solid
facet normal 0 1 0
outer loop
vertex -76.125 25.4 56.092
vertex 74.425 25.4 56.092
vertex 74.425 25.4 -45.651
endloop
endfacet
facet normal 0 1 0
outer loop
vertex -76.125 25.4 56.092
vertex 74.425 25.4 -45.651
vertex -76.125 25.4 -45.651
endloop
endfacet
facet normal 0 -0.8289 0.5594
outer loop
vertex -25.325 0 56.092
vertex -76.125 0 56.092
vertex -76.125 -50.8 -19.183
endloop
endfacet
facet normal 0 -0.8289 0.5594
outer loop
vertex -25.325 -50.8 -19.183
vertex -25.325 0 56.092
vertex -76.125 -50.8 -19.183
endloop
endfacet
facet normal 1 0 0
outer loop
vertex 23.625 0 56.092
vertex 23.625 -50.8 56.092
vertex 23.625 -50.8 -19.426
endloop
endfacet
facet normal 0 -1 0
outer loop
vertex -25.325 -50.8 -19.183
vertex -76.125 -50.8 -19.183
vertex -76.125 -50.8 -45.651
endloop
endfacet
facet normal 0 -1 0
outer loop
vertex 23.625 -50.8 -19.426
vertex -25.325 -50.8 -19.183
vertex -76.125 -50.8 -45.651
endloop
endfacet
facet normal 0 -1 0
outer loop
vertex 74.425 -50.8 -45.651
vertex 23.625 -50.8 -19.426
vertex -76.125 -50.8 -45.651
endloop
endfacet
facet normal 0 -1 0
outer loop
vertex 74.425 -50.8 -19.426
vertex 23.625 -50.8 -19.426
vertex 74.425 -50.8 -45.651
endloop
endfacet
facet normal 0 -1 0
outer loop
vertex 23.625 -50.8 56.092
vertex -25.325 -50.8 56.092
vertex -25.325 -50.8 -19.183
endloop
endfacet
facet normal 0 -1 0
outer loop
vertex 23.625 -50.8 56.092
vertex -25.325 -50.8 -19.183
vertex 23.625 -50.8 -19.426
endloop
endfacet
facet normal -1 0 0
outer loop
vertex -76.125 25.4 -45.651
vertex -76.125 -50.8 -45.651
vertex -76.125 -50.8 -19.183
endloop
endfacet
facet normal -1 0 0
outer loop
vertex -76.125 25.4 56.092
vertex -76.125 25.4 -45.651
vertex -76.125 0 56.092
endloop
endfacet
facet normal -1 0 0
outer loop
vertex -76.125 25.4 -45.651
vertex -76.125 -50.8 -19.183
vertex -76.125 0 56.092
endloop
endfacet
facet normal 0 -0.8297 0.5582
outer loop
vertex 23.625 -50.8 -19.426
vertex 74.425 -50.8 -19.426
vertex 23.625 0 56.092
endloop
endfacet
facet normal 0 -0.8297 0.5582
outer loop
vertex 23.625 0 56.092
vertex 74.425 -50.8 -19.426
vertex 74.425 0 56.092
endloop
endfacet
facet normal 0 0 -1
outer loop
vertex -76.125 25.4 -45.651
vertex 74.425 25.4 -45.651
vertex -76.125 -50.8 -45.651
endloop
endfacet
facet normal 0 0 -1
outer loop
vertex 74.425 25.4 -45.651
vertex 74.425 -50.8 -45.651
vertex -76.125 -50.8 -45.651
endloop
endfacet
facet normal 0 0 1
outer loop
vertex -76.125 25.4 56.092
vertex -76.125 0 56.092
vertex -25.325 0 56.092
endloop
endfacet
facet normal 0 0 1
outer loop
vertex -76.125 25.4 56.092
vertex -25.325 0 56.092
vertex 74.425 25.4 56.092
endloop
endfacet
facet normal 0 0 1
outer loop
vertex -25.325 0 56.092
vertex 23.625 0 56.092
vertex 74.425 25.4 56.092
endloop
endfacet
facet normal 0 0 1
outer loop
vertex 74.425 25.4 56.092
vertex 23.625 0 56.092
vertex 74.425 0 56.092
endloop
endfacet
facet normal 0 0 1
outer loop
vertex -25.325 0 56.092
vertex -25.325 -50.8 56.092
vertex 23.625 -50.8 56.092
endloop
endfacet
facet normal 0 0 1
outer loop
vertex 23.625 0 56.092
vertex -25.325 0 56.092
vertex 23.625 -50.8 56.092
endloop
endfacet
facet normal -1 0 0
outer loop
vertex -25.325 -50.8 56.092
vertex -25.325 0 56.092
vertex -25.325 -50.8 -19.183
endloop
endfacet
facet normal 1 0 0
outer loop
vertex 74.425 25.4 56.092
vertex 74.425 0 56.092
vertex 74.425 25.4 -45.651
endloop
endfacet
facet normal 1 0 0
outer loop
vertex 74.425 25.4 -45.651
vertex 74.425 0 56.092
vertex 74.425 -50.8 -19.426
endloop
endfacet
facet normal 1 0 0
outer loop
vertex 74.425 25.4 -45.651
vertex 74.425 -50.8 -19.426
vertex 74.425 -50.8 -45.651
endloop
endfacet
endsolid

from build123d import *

# Parameters (mm, degrees)
F0_W     = 150.5499258637
F0_H     = 101.7426103354
F1_DEPTH = 50.8
F3_DEPTH = 50.8
F5_DEPTH = 50.8
F7_DEPTH = 25.4


with BuildPart() as f1:
    # F0 (on Front) → F1 (new body)
    with BuildSketch(Plane.XZ):
        with Locations((-0.8498765528, 5.2206814289)):
            Rectangle(F0_W, F0_H)
    extrude(amount=F1_DEPTH)

    # F2 (on face) → F3 (cut)
    with BuildSketch(Plane(origin=(-76.1248394847, 0, 0), x_dir=(0, -1, 0), z_dir=(-1, 0, 0))):
        Polygon((0, 56.0919865966), (50.8, -19.1829744726), (50.8, 56.0919865966), align=None)
    extrude(amount=-F3_DEPTH, mode=Mode.SUBTRACT)

    # F4 (on face) → F5 (cut)
    with BuildSketch(Plane.YZ.offset(74.4250863791)):
        Polygon((-50.8, 56.0919865966), (-50.8, -19.4257982075), (0, 56.0919865966), align=None)
    extrude(amount=-F5_DEPTH, mode=Mode.SUBTRACT)

    # F6 (on face) → F7 (join)
    with BuildSketch(Plane(origin=(0, 0, 0), x_dir=(-1, 0, 0), z_dir=(0, 1, 0))):
        Polygon((-23.6250863791, 56.0919865966), (-74.4250863791, 56.0919865966), (-74.4250863791, -45.6506237388), (76.1248394847, -45.6506237388), (76.1248394847, 56.0919865966), (25.3248394847, 56.0919865966), align=None)
    extrude(amount=F7_DEPTH)


solid = f1.part
